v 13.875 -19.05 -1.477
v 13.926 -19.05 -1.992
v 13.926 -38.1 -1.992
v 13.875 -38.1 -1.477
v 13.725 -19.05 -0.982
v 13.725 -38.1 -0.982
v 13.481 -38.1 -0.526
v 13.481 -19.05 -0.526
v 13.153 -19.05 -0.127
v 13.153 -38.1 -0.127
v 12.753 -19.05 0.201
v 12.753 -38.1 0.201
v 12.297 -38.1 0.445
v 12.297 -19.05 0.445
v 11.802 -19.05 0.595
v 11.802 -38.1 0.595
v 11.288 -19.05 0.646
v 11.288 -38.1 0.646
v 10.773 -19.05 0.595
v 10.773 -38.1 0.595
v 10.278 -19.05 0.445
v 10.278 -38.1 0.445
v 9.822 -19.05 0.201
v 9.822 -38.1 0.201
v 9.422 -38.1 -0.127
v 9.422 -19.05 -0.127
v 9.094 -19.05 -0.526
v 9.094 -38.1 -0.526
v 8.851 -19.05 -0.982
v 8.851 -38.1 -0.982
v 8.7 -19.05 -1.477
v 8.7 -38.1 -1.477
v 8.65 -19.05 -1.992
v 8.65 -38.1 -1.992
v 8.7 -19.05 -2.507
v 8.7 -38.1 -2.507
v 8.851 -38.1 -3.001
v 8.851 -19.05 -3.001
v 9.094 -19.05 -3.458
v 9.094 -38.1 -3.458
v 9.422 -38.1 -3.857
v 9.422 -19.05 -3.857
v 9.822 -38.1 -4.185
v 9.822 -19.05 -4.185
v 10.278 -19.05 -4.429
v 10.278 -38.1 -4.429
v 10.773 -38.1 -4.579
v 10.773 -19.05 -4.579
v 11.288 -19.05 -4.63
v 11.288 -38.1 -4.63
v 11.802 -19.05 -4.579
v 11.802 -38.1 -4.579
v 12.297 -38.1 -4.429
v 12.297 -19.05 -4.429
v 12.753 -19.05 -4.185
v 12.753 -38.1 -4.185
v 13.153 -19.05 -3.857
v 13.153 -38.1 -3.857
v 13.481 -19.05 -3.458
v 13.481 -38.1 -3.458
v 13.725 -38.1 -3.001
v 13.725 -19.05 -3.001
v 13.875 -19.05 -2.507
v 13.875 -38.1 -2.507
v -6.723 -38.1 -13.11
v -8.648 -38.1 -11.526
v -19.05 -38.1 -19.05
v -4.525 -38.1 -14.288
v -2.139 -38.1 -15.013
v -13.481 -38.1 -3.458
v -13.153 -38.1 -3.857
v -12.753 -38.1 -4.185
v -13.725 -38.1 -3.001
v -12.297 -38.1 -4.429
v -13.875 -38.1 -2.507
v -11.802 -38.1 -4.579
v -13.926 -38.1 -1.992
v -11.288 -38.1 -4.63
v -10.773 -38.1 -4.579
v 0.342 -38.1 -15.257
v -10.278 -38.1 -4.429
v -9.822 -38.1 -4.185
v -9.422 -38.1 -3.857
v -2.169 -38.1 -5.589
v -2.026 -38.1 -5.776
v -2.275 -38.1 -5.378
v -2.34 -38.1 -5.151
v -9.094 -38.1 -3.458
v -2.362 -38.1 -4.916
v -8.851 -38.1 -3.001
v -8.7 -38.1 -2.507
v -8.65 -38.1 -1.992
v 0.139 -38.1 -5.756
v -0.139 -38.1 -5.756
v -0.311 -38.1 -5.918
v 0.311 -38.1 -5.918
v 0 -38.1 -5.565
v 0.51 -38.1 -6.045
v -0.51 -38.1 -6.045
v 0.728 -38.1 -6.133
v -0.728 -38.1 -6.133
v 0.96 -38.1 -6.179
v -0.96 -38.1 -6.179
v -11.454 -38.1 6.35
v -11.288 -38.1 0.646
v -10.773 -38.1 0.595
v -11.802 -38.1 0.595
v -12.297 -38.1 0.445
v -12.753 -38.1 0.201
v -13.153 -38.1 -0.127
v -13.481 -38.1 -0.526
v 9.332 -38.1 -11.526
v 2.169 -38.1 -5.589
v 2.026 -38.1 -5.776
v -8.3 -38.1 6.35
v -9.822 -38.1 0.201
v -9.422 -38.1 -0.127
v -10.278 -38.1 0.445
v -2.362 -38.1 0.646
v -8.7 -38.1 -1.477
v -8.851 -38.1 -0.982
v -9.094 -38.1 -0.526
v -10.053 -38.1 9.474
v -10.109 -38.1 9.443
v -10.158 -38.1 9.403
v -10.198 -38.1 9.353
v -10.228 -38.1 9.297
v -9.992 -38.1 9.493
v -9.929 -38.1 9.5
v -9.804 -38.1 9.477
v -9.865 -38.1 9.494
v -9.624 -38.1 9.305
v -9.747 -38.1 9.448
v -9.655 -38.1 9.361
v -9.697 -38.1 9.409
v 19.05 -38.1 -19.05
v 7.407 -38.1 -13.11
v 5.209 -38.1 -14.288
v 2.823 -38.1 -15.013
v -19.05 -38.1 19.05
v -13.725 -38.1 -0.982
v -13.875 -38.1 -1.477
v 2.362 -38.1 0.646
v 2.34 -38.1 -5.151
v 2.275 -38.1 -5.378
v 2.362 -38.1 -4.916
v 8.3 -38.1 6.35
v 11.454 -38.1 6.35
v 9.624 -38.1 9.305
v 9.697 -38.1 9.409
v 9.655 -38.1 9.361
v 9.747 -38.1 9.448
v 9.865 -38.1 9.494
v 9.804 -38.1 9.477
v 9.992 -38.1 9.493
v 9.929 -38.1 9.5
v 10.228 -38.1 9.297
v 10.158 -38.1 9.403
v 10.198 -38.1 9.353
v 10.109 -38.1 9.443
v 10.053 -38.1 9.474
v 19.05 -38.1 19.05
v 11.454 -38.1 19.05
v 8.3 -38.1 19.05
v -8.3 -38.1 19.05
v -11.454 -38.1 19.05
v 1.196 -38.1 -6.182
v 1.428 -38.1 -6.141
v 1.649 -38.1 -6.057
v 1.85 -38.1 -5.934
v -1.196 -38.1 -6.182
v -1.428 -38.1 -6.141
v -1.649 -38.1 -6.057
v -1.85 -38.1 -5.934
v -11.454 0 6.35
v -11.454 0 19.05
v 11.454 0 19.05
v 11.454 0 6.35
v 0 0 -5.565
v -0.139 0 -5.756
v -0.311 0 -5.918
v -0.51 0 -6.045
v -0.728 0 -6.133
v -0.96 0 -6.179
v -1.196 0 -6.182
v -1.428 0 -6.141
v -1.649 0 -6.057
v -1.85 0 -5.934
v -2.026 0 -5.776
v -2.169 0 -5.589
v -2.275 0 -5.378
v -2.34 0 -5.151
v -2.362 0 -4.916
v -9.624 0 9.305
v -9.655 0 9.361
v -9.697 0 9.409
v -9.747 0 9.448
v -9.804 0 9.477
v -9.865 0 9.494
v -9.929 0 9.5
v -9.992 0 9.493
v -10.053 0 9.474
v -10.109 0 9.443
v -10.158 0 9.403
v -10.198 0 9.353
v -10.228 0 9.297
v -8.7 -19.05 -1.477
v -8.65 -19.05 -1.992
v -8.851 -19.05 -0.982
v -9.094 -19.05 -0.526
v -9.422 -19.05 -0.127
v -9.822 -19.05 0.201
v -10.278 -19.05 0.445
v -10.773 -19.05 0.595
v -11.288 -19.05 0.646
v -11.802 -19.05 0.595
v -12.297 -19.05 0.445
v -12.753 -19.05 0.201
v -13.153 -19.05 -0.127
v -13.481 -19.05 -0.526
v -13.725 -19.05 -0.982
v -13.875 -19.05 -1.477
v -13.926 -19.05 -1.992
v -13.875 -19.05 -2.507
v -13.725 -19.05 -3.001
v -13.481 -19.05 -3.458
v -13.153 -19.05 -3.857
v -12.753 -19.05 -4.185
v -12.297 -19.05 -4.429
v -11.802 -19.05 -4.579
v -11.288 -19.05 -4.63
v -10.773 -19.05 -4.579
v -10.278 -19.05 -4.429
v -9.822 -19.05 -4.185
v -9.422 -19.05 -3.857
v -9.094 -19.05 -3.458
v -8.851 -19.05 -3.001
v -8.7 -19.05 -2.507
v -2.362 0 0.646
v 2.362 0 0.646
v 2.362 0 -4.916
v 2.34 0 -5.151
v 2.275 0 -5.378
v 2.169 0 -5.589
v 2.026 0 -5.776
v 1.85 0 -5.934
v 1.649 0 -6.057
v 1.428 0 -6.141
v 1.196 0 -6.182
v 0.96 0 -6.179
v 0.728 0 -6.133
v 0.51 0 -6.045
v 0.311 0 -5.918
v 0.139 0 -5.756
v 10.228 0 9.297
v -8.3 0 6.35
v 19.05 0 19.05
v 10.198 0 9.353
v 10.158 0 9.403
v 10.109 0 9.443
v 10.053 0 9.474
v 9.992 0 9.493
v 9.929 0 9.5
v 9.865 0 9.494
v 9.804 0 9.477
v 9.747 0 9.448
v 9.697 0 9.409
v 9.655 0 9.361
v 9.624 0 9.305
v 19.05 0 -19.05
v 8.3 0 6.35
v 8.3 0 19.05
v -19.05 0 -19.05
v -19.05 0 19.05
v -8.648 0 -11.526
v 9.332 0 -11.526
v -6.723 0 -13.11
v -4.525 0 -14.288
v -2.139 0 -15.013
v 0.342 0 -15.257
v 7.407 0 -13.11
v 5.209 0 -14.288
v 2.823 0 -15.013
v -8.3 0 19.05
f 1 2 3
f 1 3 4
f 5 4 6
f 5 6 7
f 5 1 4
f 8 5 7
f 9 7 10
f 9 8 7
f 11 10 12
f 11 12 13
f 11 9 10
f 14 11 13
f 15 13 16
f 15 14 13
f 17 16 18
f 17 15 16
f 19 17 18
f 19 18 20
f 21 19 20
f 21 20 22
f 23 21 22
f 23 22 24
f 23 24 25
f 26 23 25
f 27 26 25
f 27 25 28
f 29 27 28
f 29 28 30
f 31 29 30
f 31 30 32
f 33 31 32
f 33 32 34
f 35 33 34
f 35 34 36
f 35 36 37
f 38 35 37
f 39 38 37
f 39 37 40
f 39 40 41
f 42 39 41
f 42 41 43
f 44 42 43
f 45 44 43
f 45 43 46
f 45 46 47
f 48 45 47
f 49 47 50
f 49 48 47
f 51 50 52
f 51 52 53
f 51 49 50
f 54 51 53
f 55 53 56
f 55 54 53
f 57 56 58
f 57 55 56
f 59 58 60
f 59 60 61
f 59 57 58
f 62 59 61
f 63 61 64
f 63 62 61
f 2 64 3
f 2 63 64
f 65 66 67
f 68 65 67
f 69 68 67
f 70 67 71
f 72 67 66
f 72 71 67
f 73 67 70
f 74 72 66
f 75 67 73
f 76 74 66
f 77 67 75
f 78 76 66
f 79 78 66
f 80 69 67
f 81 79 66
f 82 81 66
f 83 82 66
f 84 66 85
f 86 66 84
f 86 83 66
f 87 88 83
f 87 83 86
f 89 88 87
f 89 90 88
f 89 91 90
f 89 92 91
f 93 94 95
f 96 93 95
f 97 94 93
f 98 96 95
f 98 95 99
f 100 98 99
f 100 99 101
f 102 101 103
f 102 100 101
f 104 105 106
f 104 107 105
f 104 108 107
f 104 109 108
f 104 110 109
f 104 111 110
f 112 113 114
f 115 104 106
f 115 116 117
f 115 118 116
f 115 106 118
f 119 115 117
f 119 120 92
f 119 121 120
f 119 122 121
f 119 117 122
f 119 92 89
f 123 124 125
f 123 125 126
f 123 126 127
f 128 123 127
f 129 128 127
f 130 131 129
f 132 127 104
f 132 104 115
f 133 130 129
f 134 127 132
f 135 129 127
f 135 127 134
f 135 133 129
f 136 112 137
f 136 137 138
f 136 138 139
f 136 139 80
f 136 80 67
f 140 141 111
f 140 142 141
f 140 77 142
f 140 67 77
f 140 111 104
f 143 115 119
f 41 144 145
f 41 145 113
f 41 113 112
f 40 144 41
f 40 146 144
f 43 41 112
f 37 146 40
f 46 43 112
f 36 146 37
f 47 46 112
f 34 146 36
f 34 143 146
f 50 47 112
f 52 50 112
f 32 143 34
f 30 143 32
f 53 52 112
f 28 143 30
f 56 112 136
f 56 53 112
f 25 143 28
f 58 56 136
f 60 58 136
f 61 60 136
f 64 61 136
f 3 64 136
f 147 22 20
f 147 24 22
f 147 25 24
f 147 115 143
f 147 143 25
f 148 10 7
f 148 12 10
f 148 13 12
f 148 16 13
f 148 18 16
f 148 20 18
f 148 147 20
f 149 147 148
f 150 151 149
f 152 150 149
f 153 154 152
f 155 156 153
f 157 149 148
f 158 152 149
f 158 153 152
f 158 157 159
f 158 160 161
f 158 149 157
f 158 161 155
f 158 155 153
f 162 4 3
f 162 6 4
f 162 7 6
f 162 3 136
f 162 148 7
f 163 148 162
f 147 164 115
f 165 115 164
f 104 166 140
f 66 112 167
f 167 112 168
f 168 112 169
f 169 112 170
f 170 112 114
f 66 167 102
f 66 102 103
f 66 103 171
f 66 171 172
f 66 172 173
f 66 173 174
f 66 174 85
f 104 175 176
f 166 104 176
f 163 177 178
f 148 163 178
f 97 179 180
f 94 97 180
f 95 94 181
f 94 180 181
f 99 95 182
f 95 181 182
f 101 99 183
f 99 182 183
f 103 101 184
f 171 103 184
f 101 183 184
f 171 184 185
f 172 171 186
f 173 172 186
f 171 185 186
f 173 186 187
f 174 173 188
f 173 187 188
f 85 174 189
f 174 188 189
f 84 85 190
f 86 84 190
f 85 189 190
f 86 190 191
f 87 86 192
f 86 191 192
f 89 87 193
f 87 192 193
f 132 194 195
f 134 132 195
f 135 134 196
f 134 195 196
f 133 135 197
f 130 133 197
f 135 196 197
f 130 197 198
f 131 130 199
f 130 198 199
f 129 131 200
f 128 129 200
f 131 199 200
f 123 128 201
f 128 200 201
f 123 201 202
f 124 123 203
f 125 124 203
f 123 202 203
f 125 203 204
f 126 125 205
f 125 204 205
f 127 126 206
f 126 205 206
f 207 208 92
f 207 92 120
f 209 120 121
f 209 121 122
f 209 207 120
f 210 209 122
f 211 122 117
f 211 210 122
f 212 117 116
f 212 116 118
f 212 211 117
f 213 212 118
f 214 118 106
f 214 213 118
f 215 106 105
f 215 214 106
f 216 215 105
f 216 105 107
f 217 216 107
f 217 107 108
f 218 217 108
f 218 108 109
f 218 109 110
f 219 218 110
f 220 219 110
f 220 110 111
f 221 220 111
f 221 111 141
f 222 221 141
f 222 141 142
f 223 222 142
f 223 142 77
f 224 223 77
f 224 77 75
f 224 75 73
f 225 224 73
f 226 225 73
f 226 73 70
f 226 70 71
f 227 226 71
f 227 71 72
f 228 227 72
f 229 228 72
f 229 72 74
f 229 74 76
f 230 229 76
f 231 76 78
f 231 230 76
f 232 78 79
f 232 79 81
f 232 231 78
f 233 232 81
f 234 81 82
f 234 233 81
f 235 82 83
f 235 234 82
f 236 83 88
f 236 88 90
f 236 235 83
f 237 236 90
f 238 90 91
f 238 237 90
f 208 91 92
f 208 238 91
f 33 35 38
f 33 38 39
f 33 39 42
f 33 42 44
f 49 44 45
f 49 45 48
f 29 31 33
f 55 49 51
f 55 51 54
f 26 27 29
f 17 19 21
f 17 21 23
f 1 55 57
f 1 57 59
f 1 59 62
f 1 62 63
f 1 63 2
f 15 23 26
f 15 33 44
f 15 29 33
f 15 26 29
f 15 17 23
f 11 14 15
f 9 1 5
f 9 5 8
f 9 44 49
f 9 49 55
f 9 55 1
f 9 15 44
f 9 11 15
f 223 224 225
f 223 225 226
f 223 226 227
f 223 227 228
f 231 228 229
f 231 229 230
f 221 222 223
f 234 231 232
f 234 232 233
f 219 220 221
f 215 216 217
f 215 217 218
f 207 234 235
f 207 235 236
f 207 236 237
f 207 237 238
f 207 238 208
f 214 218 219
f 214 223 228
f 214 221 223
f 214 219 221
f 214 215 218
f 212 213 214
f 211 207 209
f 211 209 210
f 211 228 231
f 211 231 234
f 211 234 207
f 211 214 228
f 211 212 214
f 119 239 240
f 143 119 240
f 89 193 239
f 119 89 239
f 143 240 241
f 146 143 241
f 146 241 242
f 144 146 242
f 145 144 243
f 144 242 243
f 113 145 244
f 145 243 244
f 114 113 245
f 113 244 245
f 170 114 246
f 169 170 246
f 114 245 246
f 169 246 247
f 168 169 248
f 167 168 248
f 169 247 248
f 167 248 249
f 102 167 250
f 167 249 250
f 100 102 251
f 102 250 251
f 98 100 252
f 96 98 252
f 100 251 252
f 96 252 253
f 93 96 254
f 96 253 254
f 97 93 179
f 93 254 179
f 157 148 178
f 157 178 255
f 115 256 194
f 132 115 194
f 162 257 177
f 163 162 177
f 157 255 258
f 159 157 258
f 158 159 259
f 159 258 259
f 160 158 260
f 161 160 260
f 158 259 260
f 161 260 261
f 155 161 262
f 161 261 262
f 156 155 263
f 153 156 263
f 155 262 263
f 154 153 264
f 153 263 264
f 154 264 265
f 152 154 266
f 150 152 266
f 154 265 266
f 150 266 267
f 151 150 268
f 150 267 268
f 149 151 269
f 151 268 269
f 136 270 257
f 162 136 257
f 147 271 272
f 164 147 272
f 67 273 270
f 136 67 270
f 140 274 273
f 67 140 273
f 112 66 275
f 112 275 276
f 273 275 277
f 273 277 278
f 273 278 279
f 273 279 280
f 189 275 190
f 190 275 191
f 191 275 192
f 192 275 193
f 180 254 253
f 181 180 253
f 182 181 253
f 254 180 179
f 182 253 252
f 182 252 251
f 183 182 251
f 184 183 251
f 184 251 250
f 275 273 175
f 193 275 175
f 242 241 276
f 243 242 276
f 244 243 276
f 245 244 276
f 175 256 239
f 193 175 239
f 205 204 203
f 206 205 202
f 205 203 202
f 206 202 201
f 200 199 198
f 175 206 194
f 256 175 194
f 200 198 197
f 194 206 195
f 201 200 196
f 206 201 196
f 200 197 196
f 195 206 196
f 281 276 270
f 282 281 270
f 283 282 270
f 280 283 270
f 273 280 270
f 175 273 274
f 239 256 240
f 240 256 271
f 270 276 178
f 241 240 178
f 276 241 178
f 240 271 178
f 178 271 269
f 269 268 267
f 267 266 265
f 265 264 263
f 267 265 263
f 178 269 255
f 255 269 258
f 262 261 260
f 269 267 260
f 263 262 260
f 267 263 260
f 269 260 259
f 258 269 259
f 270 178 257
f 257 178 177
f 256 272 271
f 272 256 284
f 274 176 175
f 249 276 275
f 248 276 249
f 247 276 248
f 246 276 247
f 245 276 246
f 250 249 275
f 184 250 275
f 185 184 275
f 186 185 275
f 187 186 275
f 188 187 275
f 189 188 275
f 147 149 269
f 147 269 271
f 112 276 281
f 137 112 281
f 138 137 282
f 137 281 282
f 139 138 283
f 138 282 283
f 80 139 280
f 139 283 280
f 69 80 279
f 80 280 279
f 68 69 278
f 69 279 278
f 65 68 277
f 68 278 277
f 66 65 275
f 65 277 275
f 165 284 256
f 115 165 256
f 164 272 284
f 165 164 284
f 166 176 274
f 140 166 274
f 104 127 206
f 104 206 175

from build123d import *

# Parameters (mm, degrees)
F0_R     = 2.637924
F1_DEPTH = 38.1
F2_DEPTH = 19.05


with BuildPart() as f1:
    # F0 (on Front) → F1 (new body)
    with BuildSketch(Plane.XZ):
        with BuildLine():
            Line((-11.453714, 19.05), (-19.05, 19.05))
            Line((-19.05, 19.05), (-19.05, -19.05))
            Line((-19.05, -19.05), (19.05, -19.05))
            Line((19.05, -19.05), (19.05, 19.05))
            Line((19.05, 19.05), (11.453714, 19.05))
            Line((11.453714, 19.05), (11.453714, 6.35))
            Line((11.453714, 6.35), (10.227945, 9.297051))
            ThreePointArc((10.227945, 9.297051), (9.928561, 9.499715), (9.623805, 9.305221))
            Line((9.623805, 9.305221), (8.299793, 6.35))
            Line((8.299793, 6.35), (8.299793, 19.05))
            Line((8.299793, 19.05), (0, 19.05))
            Line((0, 19.05), (-8.299793, 19.05))
            Line((-8.299793, 19.05), (-8.299793, 6.35))
            Line((-8.299793, 6.35), (-9.623805, 9.305221))
            ThreePointArc((-9.623805, 9.305221), (-9.928561, 9.499715), (-10.227945, 9.297051))
            Line((-10.227945, 9.297051), (-11.453714, 6.35))
            Line((-11.453714, 6.35), (-11.453714, 19.05))
        make_face()
        with Locations((-11.287717, -1.99195)):
            Circle(F0_R, mode=Mode.SUBTRACT)
        with BuildLine():
            ThreePointArc((9.332039, -11.526389), (0.341904, -15.257474), (-8.648231, -11.526389))
            Line((-8.648231, -11.526389), (9.332039, -11.526389))
        make_face(mode=Mode.SUBTRACT)
        with BuildLine():
            Line((-2.361556, 0.645974), (0, 0.645974))
            Line((0, 0.645974), (2.361556, 0.645974))
            Line((2.361556, 0.645974), (2.361556, -4.915977))
            ThreePointArc((2.361556, -4.915977), (1.428174, -6.140554), (0, -5.565134))
            ThreePointArc((0, -5.565134), (-1.428174, -6.140554), (-2.361556, -4.915977))
            Line((-2.361556, -4.915977), (-2.361556, 0.645974))
        make_face(mode=Mode.SUBTRACT)
        with Locations((11.287717, -1.99195)):
            Circle(F0_R, mode=Mode.SUBTRACT)
    extrude(amount=F1_DEPTH)

    # F0 (on Front) → F2 (join)
    with BuildSketch(Plane.XZ):
        with Locations((-11.287717, -1.99195)):
            Circle(F0_R)
        with Locations((11.287717, -1.99195)):
            Circle(F0_R)
    extrude(amount=F2_DEPTH)


solid = f1.part
